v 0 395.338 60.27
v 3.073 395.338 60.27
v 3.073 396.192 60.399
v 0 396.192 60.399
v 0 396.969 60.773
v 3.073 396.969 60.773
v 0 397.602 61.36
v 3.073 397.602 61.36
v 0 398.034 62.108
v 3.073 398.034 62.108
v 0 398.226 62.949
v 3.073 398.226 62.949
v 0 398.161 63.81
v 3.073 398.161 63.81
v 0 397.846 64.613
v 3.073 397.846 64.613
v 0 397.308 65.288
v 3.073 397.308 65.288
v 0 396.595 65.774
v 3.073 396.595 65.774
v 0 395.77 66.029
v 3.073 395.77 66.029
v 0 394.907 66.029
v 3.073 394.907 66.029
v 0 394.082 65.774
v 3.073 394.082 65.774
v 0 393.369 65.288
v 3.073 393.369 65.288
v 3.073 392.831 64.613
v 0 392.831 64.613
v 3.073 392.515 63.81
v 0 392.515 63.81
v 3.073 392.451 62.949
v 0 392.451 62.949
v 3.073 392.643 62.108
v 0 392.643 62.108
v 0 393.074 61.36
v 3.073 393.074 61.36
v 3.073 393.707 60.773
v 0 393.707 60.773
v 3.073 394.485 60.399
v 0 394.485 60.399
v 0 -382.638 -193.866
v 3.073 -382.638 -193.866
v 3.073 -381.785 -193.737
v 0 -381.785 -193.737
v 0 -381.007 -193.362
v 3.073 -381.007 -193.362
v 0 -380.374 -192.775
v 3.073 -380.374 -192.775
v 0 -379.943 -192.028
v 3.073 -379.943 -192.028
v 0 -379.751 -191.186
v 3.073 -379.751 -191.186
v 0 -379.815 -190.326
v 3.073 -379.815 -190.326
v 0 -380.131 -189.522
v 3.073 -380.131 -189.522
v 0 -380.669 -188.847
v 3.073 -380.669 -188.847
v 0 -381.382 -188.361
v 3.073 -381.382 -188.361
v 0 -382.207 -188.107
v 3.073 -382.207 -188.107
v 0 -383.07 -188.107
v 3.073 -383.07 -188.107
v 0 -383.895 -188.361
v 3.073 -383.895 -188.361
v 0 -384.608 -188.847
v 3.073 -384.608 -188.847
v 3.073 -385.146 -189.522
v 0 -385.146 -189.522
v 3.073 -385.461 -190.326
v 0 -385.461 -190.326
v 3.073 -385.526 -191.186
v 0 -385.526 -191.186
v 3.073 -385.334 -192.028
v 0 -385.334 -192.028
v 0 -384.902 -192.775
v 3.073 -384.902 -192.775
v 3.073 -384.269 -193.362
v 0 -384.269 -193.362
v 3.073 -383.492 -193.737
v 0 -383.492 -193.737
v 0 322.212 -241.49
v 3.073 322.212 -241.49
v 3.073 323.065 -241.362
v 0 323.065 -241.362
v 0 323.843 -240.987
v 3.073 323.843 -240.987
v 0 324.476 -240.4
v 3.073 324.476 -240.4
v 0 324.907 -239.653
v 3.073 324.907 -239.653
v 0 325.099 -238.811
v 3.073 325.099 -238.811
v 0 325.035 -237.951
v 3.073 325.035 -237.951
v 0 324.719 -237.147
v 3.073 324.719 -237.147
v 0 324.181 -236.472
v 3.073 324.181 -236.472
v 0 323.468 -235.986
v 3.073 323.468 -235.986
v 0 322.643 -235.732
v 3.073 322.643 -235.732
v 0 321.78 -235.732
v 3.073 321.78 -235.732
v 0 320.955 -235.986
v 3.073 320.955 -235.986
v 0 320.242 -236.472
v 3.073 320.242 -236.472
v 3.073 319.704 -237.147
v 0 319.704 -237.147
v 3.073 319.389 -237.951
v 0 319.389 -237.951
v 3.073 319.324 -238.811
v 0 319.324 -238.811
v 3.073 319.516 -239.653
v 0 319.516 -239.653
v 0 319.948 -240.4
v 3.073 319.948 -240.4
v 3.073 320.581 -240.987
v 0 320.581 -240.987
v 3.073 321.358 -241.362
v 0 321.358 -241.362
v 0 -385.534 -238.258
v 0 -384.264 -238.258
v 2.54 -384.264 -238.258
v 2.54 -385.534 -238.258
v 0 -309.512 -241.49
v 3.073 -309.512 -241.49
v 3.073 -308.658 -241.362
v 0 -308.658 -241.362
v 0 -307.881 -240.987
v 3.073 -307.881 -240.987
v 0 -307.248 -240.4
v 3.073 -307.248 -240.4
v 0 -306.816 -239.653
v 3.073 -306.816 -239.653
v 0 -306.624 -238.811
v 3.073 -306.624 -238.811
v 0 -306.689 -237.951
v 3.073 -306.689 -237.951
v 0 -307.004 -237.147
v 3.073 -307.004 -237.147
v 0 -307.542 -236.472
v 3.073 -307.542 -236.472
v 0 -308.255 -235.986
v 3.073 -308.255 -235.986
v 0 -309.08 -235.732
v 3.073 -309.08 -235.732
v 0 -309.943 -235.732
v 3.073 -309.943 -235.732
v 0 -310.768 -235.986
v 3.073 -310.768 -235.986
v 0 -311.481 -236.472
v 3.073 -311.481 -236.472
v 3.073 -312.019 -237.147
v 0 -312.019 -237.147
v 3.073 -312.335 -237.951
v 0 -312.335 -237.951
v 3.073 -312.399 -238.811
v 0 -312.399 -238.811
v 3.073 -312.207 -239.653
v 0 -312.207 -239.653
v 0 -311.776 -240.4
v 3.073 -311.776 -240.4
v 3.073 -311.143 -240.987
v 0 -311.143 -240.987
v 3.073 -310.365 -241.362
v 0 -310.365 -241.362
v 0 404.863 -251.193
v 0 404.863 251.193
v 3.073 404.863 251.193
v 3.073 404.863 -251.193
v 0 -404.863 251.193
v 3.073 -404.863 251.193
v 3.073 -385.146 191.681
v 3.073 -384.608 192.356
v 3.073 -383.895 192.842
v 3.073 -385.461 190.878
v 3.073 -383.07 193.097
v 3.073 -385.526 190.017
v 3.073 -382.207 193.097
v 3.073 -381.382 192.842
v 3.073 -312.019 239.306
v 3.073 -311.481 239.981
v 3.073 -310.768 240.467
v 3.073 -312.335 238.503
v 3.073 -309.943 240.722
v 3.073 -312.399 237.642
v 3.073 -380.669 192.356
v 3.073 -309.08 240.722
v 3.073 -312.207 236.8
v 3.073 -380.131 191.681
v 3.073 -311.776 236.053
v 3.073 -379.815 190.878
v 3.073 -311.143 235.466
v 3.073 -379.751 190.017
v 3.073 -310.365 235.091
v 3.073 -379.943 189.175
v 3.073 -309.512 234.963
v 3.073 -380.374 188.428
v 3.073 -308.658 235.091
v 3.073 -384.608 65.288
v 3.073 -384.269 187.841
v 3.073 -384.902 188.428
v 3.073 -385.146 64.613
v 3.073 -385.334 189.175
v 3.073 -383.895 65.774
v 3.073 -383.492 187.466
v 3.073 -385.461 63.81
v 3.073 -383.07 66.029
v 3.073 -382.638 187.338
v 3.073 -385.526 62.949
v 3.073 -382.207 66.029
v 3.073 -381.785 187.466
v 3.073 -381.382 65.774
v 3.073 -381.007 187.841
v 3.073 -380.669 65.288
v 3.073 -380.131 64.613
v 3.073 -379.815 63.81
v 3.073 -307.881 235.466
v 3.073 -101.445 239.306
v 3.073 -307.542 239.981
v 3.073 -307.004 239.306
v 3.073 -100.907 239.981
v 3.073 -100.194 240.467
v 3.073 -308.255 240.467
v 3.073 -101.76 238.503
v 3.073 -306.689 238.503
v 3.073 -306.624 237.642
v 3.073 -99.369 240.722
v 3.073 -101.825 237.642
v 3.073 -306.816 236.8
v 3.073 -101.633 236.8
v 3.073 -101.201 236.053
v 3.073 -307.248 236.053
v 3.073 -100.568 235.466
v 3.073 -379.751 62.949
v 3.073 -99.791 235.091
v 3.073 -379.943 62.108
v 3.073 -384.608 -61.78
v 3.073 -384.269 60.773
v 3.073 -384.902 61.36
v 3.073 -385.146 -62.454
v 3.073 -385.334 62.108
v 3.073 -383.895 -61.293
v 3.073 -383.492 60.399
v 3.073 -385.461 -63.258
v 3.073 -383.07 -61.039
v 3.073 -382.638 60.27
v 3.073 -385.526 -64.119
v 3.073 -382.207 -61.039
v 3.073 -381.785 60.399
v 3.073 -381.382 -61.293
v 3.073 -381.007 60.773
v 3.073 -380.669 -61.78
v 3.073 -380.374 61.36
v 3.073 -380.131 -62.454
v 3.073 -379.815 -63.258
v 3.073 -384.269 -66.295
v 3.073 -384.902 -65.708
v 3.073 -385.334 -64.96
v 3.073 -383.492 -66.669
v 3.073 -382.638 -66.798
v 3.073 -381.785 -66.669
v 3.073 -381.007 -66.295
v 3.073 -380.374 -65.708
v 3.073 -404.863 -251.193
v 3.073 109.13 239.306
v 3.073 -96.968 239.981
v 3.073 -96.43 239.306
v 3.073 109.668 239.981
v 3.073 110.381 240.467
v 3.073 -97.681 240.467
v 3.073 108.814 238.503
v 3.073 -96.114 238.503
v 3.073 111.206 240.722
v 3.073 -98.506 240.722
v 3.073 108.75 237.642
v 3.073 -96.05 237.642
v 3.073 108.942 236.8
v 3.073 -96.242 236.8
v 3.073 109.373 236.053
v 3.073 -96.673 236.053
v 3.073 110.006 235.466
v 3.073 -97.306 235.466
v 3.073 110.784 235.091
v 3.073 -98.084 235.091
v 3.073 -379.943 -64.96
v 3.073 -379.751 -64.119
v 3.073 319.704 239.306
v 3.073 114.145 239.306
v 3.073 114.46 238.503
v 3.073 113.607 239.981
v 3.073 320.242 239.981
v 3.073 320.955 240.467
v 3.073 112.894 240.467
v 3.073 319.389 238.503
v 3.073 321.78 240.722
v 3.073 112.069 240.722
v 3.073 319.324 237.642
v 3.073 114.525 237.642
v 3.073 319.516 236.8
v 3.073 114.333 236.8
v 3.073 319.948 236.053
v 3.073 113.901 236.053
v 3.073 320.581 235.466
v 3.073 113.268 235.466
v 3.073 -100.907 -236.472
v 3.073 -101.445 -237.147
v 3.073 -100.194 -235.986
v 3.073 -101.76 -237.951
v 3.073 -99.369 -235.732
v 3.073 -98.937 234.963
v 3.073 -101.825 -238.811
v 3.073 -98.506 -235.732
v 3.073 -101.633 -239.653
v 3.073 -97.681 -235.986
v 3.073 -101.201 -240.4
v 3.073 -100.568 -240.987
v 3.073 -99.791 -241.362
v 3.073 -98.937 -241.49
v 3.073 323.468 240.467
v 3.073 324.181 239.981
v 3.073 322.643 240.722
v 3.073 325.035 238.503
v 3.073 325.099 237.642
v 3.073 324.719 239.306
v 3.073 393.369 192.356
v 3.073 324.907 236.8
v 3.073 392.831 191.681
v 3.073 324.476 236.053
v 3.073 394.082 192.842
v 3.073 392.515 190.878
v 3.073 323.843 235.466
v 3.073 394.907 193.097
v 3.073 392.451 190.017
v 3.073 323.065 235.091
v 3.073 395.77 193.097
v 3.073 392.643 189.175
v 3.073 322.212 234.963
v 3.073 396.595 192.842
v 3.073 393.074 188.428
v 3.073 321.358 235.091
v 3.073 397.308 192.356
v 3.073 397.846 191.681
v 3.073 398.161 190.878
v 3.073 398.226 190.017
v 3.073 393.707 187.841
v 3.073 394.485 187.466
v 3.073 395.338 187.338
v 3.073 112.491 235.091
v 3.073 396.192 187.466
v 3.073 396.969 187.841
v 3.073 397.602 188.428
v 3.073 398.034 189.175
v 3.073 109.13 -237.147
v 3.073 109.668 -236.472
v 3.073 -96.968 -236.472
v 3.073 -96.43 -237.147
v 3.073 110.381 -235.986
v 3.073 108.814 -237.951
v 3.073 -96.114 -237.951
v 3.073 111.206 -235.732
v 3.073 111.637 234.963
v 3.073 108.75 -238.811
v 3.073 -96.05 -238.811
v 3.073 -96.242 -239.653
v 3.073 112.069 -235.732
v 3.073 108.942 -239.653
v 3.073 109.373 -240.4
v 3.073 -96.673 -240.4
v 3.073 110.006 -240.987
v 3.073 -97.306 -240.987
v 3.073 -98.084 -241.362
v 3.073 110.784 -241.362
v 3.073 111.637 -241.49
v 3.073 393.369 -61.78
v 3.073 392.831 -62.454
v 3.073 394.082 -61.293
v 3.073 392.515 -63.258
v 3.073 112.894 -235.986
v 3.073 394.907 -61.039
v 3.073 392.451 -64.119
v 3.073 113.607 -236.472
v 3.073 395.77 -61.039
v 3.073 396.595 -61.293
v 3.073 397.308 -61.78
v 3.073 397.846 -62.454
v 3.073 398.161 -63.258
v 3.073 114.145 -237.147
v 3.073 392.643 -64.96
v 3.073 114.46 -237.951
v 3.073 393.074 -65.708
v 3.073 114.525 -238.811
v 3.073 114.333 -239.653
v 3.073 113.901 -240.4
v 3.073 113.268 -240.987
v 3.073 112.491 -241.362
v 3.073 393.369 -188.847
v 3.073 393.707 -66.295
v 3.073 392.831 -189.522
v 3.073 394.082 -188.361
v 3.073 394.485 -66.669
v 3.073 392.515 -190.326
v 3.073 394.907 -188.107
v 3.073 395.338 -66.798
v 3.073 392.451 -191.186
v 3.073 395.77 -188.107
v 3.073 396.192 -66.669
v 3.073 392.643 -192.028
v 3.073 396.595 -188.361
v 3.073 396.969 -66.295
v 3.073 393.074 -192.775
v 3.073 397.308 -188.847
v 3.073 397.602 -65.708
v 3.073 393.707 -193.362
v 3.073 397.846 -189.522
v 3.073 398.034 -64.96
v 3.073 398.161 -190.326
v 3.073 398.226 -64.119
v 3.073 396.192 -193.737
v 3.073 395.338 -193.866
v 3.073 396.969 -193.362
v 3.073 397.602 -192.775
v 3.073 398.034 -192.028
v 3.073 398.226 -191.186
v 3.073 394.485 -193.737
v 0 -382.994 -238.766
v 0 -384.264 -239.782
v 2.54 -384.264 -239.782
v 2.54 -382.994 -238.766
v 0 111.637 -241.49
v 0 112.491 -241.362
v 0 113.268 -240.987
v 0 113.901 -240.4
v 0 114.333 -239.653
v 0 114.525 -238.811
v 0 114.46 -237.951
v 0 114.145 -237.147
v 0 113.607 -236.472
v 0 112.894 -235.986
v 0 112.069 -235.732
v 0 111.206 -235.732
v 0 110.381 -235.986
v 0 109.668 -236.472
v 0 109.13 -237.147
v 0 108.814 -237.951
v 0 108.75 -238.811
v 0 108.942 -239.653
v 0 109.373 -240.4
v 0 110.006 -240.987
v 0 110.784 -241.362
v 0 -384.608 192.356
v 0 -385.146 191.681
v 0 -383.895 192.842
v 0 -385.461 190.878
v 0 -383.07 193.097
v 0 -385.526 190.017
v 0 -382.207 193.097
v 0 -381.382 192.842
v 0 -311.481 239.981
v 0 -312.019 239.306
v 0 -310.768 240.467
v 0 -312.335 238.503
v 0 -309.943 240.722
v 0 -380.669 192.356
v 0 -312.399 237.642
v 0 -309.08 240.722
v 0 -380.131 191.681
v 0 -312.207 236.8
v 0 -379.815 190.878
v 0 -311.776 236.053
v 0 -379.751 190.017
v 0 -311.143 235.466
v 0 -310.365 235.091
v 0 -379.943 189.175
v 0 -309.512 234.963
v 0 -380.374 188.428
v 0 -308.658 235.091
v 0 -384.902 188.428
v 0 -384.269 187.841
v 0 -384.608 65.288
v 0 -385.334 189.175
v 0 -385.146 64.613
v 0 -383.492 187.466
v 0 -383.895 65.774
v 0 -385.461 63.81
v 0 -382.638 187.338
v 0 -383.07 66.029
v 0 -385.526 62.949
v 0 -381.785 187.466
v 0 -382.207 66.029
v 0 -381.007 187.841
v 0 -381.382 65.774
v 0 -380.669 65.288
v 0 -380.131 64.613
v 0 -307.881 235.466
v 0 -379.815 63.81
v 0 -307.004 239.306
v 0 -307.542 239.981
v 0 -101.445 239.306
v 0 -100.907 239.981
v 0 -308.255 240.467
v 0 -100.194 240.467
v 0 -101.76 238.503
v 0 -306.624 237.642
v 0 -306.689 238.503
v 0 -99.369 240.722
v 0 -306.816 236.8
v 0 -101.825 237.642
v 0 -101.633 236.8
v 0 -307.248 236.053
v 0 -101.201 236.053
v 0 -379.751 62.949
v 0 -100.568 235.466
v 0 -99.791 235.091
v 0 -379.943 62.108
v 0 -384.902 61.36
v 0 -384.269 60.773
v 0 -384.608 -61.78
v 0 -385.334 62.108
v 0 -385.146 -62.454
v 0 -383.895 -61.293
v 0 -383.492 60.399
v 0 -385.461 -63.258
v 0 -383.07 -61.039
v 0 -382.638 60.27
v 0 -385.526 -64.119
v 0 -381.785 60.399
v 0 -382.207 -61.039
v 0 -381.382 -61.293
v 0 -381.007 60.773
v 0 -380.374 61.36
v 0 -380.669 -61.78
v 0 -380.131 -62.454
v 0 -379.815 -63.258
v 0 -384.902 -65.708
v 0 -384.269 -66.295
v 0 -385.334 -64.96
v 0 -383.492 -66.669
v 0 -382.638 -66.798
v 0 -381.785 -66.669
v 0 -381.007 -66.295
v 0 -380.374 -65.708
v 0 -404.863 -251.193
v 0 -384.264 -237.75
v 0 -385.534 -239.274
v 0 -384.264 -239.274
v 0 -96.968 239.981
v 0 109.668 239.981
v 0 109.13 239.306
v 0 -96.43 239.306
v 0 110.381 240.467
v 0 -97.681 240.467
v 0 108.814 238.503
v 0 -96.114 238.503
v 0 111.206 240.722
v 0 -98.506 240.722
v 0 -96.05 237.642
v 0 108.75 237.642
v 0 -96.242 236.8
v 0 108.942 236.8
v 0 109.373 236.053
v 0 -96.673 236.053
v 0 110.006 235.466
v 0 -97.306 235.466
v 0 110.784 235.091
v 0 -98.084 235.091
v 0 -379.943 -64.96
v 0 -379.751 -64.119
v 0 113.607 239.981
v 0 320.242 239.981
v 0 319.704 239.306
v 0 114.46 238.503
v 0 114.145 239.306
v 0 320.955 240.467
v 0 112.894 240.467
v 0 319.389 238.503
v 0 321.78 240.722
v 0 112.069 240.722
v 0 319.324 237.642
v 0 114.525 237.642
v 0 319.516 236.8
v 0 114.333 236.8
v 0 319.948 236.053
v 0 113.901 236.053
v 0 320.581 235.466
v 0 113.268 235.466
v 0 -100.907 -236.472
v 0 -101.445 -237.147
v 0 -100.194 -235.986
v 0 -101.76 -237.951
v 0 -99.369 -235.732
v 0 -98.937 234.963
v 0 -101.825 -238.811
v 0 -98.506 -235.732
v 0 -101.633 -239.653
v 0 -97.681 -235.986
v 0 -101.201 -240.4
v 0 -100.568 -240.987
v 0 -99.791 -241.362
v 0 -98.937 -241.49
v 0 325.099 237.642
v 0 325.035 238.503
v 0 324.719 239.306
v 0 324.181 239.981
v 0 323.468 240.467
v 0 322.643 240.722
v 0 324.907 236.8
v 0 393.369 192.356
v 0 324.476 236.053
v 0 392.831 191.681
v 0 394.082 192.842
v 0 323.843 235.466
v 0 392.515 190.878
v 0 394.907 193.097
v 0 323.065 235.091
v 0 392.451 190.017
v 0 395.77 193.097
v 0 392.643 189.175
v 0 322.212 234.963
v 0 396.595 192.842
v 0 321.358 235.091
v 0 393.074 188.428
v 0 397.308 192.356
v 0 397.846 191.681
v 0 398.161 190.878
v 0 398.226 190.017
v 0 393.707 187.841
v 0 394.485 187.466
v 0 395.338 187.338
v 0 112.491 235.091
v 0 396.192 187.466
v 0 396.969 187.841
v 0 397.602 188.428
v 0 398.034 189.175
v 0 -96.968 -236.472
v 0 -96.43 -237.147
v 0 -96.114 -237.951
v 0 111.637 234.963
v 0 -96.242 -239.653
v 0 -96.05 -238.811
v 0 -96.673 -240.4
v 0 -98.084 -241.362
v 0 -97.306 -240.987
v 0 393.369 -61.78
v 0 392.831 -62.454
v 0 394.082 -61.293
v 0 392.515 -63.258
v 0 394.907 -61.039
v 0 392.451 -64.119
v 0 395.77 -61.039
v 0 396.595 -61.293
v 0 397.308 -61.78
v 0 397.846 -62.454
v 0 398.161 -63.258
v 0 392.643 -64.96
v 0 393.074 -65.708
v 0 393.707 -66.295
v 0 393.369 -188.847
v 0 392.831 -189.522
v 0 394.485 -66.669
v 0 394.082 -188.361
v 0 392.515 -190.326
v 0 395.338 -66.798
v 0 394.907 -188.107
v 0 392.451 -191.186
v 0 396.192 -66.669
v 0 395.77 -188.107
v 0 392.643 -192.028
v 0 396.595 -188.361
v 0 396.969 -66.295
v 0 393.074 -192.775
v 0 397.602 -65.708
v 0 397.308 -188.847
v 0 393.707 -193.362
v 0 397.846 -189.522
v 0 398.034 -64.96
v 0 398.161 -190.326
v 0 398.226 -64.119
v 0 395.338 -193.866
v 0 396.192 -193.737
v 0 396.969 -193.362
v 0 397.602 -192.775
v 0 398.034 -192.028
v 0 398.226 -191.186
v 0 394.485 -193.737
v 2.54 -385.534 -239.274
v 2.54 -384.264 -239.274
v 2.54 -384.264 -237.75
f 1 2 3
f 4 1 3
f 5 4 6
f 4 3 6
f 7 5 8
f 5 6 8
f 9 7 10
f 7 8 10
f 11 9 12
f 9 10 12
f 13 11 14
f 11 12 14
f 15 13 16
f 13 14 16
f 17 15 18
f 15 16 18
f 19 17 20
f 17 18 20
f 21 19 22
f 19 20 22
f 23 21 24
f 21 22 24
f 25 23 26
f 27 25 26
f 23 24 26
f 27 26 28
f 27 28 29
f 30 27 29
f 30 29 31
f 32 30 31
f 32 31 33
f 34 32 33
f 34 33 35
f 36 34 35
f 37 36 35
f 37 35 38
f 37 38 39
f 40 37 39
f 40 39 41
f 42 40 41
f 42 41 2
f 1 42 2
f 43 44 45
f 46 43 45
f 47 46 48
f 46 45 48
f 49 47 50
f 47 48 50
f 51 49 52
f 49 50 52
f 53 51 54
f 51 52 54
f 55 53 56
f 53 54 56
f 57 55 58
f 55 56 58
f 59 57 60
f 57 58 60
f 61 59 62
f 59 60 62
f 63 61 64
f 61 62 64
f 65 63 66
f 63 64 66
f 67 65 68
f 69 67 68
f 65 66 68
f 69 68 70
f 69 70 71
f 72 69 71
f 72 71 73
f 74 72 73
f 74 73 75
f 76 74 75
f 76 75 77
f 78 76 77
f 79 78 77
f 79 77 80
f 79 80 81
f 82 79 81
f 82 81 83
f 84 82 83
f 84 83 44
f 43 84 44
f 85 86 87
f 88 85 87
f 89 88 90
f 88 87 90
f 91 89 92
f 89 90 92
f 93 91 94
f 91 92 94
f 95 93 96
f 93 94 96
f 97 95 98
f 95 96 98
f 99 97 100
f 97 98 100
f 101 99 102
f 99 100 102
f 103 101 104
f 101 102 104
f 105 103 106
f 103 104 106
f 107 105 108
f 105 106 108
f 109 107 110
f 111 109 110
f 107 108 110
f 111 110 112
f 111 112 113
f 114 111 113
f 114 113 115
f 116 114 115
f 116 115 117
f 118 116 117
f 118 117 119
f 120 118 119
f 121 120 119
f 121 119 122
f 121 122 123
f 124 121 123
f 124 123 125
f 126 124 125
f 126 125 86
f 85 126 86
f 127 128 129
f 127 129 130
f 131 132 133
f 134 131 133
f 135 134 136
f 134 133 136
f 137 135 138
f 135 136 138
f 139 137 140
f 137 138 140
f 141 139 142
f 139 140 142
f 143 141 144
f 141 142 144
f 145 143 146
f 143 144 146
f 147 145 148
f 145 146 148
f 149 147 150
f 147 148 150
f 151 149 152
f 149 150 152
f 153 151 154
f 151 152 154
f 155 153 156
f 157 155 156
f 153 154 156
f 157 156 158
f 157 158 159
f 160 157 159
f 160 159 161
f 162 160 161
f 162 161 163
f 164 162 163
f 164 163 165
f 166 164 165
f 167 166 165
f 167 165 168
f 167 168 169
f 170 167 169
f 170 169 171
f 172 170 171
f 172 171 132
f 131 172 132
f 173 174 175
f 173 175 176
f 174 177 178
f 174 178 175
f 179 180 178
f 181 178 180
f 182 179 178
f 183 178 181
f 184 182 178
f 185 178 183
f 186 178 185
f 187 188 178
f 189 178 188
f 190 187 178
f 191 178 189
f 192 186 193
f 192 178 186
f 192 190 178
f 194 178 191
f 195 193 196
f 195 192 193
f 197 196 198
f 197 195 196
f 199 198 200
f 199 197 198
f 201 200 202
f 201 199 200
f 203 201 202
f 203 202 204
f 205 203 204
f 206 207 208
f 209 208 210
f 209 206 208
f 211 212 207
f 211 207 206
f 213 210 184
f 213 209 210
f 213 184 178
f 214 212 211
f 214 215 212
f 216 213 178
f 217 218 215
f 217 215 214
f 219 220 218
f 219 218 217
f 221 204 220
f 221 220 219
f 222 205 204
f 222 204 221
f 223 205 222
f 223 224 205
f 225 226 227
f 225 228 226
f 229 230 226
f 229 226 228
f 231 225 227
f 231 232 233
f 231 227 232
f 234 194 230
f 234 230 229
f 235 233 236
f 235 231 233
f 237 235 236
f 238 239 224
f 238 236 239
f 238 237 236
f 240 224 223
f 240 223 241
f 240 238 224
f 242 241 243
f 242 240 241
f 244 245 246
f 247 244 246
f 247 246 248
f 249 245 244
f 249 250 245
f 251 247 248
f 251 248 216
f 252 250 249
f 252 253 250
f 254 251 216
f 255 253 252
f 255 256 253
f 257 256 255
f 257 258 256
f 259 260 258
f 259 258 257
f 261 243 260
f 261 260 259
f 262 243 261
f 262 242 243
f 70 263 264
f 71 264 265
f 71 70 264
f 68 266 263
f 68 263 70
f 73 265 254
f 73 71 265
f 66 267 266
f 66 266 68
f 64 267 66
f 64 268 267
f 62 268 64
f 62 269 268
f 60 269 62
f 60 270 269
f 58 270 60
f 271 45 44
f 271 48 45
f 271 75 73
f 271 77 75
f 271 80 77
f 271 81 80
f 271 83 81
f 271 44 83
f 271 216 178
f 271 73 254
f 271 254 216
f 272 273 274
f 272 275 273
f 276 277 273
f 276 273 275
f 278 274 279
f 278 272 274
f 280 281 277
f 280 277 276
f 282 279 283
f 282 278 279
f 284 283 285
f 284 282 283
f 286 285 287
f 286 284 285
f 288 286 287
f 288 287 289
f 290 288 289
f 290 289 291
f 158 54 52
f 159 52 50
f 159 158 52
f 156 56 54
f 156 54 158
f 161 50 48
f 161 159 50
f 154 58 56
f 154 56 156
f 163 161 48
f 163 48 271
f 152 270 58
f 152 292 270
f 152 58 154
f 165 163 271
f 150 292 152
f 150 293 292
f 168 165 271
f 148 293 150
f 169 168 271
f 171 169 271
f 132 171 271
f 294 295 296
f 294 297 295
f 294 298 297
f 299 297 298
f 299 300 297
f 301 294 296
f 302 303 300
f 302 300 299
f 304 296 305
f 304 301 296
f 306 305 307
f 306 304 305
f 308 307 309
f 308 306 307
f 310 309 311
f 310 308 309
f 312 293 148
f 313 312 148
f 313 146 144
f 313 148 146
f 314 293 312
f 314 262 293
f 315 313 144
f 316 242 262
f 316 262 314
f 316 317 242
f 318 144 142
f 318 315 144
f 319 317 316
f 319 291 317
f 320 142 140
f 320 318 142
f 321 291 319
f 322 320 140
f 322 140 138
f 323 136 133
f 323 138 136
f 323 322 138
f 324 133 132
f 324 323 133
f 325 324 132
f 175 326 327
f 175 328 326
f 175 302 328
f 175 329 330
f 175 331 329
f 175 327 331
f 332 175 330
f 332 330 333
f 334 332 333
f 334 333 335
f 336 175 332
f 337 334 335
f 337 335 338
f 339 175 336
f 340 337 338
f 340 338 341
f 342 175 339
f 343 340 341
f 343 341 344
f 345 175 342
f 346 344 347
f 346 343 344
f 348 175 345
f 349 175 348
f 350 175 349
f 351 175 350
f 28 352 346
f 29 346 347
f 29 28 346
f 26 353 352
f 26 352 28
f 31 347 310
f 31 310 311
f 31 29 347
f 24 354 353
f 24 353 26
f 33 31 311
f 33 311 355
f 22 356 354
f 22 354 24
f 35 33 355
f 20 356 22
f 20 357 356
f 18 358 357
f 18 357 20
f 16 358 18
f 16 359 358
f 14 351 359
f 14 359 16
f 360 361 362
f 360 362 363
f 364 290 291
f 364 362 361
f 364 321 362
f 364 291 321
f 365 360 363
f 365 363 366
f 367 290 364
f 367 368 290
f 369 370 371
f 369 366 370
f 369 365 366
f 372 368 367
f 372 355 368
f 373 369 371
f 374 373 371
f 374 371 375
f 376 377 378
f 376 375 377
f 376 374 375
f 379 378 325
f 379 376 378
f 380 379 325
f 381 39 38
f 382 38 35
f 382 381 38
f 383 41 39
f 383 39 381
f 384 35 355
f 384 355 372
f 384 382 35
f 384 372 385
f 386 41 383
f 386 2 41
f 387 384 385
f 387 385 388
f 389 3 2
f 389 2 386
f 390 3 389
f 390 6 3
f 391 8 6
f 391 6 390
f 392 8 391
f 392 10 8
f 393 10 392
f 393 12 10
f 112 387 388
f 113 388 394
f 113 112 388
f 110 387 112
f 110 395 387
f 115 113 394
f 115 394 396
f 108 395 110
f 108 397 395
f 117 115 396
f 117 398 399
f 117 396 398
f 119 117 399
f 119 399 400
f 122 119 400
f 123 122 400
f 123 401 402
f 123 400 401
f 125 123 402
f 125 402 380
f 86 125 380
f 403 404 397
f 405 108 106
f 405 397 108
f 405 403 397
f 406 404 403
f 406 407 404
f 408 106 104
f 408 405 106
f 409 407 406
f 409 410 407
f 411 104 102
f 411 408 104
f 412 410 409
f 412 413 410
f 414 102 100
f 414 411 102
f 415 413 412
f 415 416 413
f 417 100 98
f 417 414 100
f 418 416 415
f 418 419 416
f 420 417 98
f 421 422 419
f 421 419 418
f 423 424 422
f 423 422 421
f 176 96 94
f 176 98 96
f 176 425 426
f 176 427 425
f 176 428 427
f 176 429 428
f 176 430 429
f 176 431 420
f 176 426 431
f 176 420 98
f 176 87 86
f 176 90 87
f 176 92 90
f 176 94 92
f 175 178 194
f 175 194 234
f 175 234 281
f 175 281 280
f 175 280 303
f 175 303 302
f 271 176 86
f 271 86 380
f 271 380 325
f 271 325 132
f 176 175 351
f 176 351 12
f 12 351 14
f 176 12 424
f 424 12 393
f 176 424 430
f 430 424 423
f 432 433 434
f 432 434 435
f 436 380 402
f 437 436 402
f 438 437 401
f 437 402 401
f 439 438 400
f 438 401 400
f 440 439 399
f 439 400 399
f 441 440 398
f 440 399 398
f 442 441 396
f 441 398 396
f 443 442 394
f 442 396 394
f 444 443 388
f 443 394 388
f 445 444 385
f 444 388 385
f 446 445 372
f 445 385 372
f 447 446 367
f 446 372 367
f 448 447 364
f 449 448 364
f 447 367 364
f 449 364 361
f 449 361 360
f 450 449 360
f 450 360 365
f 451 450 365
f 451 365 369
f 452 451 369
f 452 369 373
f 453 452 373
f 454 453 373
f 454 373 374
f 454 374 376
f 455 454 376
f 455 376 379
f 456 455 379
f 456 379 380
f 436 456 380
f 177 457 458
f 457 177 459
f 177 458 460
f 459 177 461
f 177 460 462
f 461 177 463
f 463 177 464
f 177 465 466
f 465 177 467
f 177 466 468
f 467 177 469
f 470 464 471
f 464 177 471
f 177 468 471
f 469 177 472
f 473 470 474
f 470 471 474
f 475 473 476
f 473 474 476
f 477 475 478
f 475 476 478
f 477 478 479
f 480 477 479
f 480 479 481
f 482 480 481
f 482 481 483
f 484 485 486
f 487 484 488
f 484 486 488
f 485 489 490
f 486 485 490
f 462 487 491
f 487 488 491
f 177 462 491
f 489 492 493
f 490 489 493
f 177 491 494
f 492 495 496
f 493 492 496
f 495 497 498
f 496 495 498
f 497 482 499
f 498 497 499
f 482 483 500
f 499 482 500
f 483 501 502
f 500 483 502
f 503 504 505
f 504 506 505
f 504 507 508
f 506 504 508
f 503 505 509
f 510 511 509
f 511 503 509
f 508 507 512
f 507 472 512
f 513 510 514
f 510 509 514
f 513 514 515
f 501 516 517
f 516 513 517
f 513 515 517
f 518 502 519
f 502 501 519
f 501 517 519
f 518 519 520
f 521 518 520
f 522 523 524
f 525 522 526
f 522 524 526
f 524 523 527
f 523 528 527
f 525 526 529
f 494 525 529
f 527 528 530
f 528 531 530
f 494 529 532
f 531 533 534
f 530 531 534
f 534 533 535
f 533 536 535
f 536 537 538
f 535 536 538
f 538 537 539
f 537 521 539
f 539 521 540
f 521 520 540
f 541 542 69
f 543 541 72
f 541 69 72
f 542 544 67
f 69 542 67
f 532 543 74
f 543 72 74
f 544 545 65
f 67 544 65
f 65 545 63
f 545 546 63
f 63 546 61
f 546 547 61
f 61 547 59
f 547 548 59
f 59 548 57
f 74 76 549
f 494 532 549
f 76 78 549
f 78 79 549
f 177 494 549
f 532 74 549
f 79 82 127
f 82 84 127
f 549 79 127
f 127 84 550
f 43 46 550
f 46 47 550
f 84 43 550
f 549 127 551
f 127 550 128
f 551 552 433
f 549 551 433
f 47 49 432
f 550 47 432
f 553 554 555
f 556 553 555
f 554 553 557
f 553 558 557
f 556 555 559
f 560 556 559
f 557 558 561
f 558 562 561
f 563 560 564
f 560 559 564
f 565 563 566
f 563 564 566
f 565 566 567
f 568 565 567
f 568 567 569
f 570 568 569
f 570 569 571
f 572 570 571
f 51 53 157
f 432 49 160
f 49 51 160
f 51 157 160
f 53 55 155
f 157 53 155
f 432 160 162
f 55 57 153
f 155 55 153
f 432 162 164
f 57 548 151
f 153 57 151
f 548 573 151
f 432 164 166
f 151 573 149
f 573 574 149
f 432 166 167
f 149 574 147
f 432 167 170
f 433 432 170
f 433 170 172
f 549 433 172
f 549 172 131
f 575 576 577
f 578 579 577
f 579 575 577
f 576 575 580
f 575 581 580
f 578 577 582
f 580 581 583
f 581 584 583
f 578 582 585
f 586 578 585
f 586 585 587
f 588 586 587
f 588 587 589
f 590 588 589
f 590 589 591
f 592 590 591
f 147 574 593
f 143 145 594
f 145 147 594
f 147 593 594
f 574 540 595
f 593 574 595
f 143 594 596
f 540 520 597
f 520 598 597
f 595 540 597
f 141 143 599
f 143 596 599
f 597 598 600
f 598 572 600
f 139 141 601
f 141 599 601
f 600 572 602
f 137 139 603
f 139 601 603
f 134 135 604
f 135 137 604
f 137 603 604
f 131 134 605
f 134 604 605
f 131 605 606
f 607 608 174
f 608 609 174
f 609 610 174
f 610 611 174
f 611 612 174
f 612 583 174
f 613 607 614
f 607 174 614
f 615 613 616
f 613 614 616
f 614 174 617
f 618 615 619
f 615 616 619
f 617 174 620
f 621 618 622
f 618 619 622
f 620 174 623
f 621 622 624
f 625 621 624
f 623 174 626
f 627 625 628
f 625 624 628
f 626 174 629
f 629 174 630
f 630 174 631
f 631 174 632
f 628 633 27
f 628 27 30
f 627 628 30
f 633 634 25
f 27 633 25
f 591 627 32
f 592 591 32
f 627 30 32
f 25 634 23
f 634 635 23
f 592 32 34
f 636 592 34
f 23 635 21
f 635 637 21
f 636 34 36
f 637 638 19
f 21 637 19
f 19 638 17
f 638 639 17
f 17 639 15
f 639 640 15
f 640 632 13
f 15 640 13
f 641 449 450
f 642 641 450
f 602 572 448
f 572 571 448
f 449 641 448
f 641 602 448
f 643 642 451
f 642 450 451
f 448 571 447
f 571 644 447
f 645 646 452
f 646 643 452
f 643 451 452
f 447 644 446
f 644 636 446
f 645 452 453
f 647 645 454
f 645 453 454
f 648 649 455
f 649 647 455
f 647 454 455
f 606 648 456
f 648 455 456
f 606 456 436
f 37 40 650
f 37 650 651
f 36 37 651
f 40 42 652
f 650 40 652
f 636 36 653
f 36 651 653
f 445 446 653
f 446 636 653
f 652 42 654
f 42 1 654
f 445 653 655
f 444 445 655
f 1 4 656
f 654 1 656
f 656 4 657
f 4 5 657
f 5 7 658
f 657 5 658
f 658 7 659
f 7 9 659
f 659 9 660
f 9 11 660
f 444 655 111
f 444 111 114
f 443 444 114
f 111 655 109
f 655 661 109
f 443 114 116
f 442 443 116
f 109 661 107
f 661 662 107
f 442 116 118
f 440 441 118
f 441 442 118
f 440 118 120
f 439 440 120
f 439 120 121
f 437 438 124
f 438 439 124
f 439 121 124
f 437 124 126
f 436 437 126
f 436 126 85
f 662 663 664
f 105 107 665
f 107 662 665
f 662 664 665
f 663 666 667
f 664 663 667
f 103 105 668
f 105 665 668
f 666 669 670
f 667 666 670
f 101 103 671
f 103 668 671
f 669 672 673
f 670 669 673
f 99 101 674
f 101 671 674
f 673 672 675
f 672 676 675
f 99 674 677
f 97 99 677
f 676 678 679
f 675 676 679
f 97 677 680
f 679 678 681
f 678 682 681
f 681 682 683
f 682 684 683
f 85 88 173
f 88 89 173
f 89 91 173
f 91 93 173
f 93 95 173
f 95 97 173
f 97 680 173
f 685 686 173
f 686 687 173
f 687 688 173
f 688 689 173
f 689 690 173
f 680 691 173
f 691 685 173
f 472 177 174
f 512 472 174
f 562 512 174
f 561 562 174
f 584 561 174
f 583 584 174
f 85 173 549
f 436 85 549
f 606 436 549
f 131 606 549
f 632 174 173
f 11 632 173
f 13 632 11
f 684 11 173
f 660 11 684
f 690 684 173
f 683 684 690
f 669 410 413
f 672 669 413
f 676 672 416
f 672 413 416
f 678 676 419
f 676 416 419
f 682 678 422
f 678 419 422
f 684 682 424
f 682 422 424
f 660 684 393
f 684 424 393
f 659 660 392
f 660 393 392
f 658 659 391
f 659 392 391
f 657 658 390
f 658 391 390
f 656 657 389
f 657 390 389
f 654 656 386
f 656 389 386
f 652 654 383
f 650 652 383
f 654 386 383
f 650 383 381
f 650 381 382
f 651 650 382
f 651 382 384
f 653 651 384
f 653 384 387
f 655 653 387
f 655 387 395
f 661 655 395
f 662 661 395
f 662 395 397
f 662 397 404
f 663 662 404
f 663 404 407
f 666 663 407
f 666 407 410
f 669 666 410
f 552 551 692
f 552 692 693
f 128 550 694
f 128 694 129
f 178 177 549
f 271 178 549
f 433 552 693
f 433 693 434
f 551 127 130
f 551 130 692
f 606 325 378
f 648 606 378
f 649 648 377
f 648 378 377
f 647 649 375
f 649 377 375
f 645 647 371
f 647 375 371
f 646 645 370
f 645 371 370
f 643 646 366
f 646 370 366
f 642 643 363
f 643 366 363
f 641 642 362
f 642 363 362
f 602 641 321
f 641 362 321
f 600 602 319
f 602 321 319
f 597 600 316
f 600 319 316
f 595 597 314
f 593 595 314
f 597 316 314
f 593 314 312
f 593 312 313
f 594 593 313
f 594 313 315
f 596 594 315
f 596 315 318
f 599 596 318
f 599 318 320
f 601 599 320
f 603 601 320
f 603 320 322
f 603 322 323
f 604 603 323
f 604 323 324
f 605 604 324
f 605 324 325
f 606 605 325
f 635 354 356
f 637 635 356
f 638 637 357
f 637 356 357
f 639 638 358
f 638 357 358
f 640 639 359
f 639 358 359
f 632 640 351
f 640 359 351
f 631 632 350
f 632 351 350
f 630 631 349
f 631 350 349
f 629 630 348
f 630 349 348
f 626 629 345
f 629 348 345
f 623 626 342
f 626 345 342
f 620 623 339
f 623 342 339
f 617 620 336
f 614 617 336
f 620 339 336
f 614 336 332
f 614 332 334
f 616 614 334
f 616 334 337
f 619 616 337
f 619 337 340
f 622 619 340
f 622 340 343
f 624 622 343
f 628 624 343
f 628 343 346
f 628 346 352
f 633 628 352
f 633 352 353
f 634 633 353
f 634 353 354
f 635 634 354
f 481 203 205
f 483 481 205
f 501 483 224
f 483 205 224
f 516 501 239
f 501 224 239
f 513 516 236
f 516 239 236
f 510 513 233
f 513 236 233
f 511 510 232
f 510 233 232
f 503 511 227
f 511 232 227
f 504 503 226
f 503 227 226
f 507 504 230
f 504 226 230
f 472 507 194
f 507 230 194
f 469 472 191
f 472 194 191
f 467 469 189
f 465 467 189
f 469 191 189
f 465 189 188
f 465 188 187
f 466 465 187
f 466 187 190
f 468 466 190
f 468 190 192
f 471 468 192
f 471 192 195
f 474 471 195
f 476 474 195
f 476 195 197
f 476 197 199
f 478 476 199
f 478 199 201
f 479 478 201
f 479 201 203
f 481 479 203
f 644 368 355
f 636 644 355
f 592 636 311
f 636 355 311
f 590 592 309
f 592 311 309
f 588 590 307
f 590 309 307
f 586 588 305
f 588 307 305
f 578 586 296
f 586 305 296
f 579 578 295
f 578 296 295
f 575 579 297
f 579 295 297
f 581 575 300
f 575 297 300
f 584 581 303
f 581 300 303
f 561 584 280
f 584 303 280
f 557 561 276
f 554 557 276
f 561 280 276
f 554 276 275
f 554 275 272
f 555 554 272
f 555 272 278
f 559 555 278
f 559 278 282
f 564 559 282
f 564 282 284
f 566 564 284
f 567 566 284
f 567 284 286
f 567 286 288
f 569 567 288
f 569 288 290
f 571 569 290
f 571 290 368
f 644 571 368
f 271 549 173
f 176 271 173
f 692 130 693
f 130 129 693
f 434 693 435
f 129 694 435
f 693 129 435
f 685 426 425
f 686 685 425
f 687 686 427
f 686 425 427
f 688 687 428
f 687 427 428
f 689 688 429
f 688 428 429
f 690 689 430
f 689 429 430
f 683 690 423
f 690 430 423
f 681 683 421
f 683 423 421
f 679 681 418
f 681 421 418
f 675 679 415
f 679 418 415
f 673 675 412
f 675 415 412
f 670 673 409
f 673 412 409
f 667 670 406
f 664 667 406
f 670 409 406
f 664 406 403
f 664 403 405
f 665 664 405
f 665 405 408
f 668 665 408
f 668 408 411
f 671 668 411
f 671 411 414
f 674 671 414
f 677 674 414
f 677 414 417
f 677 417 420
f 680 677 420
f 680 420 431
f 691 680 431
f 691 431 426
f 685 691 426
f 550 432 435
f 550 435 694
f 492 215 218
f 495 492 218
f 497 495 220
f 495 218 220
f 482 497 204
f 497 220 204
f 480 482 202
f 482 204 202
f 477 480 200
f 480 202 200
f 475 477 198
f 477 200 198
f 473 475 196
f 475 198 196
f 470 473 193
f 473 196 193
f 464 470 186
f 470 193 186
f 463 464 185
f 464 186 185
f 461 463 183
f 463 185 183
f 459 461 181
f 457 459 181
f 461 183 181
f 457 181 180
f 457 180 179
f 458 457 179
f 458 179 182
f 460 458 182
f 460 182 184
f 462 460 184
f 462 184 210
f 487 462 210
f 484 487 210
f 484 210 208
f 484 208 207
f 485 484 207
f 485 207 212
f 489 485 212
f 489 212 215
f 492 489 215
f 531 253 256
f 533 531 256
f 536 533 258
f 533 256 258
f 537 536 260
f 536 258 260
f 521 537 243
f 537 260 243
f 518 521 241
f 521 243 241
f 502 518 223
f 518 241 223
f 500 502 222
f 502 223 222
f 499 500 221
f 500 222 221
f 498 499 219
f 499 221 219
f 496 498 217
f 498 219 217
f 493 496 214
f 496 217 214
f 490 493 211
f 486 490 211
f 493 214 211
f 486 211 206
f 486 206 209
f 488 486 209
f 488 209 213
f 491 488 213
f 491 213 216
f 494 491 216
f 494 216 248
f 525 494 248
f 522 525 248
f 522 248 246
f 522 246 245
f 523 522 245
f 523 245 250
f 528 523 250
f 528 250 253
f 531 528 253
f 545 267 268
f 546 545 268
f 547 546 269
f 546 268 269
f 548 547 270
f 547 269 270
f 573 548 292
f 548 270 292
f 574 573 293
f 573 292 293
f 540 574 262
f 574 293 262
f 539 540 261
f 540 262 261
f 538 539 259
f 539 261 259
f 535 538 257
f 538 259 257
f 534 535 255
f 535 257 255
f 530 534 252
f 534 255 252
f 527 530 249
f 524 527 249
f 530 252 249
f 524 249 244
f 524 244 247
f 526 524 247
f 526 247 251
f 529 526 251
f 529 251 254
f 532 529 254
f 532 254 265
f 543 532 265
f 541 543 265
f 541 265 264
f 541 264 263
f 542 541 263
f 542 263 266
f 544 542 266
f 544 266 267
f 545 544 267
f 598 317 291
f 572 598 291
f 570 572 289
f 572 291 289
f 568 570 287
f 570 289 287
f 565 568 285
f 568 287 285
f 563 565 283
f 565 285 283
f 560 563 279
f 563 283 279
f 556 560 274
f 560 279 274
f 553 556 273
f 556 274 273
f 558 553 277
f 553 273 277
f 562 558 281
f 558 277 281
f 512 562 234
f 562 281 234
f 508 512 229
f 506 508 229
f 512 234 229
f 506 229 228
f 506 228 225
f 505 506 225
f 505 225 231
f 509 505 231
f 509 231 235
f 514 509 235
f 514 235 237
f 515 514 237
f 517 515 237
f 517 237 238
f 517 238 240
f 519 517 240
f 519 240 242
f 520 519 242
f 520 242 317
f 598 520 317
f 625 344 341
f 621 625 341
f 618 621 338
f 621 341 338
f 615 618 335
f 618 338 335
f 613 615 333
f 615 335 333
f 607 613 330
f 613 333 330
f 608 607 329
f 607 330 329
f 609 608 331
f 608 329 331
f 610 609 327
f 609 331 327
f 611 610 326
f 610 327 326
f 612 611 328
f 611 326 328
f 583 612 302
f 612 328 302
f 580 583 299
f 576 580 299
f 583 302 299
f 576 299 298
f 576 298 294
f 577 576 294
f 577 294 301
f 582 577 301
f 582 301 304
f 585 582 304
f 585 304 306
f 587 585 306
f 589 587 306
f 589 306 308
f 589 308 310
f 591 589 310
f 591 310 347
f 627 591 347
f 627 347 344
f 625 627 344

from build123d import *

# Parameters (mm, degrees)
SKETCH1_W                 = 502.3866
SKETCH1_H                 = 809.7266
SIDEPANEL_DEPTH           = 3.0734
SKETCH2_R                 = 2.8956
TOPBOTTOMHOLEMASTER_DEPTH = 4.0734
LPATTERN1_COUNT           = 4
LPATTERN1_PITCH           = 127.067733333
SKETCH3_R                 = 2.8956
REARHOLESMASTER_DEPTH     = 4.0734
LPATTERN2_COUNT           = 4
LPATTERN2_PITCH           = 210.574466667
CUT_EXTRUDE1_DEPTH        = 2.54


with BuildPart() as part:
    # Sketch1 → SidePanel (new body)
    with BuildSketch(Plane(origin=(0, 0, 0), x_dir=(0, 0, -1), z_dir=(1, 0, 0))):
        Rectangle(SKETCH1_W, SKETCH1_H)
    extrude(amount=SIDEPANEL_DEPTH)

    # Sketch2 → TopBottomHoleMaster (cut, through all)
    with BuildSketch(Plane(origin=(3.0734, 0, 0), x_dir=(0, 0, -1), z_dir=(1, 0, 0))):
        with Locations((190.9699, 395.3383)):
            Circle(SKETCH2_R)
        with Locations((190.9699, -382.6383)):
            Circle(SKETCH2_R)
    topbottomholemaster = extrude(amount=-TOPBOTTOMHOLEMASTER_DEPTH, mode=Mode.SUBTRACT)

    # LPattern1: TopBottomHoleMaster ×4
    with Locations(*[(0, 0, i * LPATTERN1_PITCH) for i in range(1, LPATTERN1_COUNT)]):
        add(topbottomholemaster, mode=Mode.SUBTRACT)

    # Sketch3 → RearHolesMaster (cut, through all)
    with BuildSketch(Plane(origin=(3.0734, 0, 0), x_dir=(0, 0, -1), z_dir=(1, 0, 0))):
        with Locations((-237.8583, 322.2117)):
            Circle(SKETCH3_R)
        with Locations((238.5949, 322.2117)):
            Circle(SKETCH3_R)
    rearholesmaster = extrude(amount=-REARHOLESMASTER_DEPTH, mode=Mode.SUBTRACT)

    # LPattern2: RearHolesMaster ×4
    with Locations(*[(0, -i * LPATTERN2_PITCH, 0) for i in range(1, LPATTERN2_COUNT)]):
        add(rearholesmaster, mode=Mode.SUBTRACT)

    # Sketch4 → Cut-Extrude1 (cut)
    with BuildSketch(Plane.ZY):
        Polygon((-238.257543072, -385.5339), (-239.273543072, -385.5339), (-239.273543072, -384.2639), (-239.781543072, -384.2639), (-238.765543072, -382.9939), (-237.749543072, -384.2639), (-238.257543072, -384.2639), align=None)
    extrude(amount=-CUT_EXTRUDE1_DEPTH, mode=Mode.SUBTRACT)


solid = part.part
